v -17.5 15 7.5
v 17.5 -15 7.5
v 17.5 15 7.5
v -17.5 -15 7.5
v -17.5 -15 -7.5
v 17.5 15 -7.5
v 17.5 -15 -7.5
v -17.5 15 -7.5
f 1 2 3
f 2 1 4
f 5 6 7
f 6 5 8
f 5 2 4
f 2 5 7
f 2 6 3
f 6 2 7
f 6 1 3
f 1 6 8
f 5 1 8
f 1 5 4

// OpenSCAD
// ========================================
// a 35 x 30 x 15 mm box
// NeuroCAD canonical IR; dimensions are millimetres
// ========================================
$fn = 48;

cube(size=[35, 30, 15], center=true);
